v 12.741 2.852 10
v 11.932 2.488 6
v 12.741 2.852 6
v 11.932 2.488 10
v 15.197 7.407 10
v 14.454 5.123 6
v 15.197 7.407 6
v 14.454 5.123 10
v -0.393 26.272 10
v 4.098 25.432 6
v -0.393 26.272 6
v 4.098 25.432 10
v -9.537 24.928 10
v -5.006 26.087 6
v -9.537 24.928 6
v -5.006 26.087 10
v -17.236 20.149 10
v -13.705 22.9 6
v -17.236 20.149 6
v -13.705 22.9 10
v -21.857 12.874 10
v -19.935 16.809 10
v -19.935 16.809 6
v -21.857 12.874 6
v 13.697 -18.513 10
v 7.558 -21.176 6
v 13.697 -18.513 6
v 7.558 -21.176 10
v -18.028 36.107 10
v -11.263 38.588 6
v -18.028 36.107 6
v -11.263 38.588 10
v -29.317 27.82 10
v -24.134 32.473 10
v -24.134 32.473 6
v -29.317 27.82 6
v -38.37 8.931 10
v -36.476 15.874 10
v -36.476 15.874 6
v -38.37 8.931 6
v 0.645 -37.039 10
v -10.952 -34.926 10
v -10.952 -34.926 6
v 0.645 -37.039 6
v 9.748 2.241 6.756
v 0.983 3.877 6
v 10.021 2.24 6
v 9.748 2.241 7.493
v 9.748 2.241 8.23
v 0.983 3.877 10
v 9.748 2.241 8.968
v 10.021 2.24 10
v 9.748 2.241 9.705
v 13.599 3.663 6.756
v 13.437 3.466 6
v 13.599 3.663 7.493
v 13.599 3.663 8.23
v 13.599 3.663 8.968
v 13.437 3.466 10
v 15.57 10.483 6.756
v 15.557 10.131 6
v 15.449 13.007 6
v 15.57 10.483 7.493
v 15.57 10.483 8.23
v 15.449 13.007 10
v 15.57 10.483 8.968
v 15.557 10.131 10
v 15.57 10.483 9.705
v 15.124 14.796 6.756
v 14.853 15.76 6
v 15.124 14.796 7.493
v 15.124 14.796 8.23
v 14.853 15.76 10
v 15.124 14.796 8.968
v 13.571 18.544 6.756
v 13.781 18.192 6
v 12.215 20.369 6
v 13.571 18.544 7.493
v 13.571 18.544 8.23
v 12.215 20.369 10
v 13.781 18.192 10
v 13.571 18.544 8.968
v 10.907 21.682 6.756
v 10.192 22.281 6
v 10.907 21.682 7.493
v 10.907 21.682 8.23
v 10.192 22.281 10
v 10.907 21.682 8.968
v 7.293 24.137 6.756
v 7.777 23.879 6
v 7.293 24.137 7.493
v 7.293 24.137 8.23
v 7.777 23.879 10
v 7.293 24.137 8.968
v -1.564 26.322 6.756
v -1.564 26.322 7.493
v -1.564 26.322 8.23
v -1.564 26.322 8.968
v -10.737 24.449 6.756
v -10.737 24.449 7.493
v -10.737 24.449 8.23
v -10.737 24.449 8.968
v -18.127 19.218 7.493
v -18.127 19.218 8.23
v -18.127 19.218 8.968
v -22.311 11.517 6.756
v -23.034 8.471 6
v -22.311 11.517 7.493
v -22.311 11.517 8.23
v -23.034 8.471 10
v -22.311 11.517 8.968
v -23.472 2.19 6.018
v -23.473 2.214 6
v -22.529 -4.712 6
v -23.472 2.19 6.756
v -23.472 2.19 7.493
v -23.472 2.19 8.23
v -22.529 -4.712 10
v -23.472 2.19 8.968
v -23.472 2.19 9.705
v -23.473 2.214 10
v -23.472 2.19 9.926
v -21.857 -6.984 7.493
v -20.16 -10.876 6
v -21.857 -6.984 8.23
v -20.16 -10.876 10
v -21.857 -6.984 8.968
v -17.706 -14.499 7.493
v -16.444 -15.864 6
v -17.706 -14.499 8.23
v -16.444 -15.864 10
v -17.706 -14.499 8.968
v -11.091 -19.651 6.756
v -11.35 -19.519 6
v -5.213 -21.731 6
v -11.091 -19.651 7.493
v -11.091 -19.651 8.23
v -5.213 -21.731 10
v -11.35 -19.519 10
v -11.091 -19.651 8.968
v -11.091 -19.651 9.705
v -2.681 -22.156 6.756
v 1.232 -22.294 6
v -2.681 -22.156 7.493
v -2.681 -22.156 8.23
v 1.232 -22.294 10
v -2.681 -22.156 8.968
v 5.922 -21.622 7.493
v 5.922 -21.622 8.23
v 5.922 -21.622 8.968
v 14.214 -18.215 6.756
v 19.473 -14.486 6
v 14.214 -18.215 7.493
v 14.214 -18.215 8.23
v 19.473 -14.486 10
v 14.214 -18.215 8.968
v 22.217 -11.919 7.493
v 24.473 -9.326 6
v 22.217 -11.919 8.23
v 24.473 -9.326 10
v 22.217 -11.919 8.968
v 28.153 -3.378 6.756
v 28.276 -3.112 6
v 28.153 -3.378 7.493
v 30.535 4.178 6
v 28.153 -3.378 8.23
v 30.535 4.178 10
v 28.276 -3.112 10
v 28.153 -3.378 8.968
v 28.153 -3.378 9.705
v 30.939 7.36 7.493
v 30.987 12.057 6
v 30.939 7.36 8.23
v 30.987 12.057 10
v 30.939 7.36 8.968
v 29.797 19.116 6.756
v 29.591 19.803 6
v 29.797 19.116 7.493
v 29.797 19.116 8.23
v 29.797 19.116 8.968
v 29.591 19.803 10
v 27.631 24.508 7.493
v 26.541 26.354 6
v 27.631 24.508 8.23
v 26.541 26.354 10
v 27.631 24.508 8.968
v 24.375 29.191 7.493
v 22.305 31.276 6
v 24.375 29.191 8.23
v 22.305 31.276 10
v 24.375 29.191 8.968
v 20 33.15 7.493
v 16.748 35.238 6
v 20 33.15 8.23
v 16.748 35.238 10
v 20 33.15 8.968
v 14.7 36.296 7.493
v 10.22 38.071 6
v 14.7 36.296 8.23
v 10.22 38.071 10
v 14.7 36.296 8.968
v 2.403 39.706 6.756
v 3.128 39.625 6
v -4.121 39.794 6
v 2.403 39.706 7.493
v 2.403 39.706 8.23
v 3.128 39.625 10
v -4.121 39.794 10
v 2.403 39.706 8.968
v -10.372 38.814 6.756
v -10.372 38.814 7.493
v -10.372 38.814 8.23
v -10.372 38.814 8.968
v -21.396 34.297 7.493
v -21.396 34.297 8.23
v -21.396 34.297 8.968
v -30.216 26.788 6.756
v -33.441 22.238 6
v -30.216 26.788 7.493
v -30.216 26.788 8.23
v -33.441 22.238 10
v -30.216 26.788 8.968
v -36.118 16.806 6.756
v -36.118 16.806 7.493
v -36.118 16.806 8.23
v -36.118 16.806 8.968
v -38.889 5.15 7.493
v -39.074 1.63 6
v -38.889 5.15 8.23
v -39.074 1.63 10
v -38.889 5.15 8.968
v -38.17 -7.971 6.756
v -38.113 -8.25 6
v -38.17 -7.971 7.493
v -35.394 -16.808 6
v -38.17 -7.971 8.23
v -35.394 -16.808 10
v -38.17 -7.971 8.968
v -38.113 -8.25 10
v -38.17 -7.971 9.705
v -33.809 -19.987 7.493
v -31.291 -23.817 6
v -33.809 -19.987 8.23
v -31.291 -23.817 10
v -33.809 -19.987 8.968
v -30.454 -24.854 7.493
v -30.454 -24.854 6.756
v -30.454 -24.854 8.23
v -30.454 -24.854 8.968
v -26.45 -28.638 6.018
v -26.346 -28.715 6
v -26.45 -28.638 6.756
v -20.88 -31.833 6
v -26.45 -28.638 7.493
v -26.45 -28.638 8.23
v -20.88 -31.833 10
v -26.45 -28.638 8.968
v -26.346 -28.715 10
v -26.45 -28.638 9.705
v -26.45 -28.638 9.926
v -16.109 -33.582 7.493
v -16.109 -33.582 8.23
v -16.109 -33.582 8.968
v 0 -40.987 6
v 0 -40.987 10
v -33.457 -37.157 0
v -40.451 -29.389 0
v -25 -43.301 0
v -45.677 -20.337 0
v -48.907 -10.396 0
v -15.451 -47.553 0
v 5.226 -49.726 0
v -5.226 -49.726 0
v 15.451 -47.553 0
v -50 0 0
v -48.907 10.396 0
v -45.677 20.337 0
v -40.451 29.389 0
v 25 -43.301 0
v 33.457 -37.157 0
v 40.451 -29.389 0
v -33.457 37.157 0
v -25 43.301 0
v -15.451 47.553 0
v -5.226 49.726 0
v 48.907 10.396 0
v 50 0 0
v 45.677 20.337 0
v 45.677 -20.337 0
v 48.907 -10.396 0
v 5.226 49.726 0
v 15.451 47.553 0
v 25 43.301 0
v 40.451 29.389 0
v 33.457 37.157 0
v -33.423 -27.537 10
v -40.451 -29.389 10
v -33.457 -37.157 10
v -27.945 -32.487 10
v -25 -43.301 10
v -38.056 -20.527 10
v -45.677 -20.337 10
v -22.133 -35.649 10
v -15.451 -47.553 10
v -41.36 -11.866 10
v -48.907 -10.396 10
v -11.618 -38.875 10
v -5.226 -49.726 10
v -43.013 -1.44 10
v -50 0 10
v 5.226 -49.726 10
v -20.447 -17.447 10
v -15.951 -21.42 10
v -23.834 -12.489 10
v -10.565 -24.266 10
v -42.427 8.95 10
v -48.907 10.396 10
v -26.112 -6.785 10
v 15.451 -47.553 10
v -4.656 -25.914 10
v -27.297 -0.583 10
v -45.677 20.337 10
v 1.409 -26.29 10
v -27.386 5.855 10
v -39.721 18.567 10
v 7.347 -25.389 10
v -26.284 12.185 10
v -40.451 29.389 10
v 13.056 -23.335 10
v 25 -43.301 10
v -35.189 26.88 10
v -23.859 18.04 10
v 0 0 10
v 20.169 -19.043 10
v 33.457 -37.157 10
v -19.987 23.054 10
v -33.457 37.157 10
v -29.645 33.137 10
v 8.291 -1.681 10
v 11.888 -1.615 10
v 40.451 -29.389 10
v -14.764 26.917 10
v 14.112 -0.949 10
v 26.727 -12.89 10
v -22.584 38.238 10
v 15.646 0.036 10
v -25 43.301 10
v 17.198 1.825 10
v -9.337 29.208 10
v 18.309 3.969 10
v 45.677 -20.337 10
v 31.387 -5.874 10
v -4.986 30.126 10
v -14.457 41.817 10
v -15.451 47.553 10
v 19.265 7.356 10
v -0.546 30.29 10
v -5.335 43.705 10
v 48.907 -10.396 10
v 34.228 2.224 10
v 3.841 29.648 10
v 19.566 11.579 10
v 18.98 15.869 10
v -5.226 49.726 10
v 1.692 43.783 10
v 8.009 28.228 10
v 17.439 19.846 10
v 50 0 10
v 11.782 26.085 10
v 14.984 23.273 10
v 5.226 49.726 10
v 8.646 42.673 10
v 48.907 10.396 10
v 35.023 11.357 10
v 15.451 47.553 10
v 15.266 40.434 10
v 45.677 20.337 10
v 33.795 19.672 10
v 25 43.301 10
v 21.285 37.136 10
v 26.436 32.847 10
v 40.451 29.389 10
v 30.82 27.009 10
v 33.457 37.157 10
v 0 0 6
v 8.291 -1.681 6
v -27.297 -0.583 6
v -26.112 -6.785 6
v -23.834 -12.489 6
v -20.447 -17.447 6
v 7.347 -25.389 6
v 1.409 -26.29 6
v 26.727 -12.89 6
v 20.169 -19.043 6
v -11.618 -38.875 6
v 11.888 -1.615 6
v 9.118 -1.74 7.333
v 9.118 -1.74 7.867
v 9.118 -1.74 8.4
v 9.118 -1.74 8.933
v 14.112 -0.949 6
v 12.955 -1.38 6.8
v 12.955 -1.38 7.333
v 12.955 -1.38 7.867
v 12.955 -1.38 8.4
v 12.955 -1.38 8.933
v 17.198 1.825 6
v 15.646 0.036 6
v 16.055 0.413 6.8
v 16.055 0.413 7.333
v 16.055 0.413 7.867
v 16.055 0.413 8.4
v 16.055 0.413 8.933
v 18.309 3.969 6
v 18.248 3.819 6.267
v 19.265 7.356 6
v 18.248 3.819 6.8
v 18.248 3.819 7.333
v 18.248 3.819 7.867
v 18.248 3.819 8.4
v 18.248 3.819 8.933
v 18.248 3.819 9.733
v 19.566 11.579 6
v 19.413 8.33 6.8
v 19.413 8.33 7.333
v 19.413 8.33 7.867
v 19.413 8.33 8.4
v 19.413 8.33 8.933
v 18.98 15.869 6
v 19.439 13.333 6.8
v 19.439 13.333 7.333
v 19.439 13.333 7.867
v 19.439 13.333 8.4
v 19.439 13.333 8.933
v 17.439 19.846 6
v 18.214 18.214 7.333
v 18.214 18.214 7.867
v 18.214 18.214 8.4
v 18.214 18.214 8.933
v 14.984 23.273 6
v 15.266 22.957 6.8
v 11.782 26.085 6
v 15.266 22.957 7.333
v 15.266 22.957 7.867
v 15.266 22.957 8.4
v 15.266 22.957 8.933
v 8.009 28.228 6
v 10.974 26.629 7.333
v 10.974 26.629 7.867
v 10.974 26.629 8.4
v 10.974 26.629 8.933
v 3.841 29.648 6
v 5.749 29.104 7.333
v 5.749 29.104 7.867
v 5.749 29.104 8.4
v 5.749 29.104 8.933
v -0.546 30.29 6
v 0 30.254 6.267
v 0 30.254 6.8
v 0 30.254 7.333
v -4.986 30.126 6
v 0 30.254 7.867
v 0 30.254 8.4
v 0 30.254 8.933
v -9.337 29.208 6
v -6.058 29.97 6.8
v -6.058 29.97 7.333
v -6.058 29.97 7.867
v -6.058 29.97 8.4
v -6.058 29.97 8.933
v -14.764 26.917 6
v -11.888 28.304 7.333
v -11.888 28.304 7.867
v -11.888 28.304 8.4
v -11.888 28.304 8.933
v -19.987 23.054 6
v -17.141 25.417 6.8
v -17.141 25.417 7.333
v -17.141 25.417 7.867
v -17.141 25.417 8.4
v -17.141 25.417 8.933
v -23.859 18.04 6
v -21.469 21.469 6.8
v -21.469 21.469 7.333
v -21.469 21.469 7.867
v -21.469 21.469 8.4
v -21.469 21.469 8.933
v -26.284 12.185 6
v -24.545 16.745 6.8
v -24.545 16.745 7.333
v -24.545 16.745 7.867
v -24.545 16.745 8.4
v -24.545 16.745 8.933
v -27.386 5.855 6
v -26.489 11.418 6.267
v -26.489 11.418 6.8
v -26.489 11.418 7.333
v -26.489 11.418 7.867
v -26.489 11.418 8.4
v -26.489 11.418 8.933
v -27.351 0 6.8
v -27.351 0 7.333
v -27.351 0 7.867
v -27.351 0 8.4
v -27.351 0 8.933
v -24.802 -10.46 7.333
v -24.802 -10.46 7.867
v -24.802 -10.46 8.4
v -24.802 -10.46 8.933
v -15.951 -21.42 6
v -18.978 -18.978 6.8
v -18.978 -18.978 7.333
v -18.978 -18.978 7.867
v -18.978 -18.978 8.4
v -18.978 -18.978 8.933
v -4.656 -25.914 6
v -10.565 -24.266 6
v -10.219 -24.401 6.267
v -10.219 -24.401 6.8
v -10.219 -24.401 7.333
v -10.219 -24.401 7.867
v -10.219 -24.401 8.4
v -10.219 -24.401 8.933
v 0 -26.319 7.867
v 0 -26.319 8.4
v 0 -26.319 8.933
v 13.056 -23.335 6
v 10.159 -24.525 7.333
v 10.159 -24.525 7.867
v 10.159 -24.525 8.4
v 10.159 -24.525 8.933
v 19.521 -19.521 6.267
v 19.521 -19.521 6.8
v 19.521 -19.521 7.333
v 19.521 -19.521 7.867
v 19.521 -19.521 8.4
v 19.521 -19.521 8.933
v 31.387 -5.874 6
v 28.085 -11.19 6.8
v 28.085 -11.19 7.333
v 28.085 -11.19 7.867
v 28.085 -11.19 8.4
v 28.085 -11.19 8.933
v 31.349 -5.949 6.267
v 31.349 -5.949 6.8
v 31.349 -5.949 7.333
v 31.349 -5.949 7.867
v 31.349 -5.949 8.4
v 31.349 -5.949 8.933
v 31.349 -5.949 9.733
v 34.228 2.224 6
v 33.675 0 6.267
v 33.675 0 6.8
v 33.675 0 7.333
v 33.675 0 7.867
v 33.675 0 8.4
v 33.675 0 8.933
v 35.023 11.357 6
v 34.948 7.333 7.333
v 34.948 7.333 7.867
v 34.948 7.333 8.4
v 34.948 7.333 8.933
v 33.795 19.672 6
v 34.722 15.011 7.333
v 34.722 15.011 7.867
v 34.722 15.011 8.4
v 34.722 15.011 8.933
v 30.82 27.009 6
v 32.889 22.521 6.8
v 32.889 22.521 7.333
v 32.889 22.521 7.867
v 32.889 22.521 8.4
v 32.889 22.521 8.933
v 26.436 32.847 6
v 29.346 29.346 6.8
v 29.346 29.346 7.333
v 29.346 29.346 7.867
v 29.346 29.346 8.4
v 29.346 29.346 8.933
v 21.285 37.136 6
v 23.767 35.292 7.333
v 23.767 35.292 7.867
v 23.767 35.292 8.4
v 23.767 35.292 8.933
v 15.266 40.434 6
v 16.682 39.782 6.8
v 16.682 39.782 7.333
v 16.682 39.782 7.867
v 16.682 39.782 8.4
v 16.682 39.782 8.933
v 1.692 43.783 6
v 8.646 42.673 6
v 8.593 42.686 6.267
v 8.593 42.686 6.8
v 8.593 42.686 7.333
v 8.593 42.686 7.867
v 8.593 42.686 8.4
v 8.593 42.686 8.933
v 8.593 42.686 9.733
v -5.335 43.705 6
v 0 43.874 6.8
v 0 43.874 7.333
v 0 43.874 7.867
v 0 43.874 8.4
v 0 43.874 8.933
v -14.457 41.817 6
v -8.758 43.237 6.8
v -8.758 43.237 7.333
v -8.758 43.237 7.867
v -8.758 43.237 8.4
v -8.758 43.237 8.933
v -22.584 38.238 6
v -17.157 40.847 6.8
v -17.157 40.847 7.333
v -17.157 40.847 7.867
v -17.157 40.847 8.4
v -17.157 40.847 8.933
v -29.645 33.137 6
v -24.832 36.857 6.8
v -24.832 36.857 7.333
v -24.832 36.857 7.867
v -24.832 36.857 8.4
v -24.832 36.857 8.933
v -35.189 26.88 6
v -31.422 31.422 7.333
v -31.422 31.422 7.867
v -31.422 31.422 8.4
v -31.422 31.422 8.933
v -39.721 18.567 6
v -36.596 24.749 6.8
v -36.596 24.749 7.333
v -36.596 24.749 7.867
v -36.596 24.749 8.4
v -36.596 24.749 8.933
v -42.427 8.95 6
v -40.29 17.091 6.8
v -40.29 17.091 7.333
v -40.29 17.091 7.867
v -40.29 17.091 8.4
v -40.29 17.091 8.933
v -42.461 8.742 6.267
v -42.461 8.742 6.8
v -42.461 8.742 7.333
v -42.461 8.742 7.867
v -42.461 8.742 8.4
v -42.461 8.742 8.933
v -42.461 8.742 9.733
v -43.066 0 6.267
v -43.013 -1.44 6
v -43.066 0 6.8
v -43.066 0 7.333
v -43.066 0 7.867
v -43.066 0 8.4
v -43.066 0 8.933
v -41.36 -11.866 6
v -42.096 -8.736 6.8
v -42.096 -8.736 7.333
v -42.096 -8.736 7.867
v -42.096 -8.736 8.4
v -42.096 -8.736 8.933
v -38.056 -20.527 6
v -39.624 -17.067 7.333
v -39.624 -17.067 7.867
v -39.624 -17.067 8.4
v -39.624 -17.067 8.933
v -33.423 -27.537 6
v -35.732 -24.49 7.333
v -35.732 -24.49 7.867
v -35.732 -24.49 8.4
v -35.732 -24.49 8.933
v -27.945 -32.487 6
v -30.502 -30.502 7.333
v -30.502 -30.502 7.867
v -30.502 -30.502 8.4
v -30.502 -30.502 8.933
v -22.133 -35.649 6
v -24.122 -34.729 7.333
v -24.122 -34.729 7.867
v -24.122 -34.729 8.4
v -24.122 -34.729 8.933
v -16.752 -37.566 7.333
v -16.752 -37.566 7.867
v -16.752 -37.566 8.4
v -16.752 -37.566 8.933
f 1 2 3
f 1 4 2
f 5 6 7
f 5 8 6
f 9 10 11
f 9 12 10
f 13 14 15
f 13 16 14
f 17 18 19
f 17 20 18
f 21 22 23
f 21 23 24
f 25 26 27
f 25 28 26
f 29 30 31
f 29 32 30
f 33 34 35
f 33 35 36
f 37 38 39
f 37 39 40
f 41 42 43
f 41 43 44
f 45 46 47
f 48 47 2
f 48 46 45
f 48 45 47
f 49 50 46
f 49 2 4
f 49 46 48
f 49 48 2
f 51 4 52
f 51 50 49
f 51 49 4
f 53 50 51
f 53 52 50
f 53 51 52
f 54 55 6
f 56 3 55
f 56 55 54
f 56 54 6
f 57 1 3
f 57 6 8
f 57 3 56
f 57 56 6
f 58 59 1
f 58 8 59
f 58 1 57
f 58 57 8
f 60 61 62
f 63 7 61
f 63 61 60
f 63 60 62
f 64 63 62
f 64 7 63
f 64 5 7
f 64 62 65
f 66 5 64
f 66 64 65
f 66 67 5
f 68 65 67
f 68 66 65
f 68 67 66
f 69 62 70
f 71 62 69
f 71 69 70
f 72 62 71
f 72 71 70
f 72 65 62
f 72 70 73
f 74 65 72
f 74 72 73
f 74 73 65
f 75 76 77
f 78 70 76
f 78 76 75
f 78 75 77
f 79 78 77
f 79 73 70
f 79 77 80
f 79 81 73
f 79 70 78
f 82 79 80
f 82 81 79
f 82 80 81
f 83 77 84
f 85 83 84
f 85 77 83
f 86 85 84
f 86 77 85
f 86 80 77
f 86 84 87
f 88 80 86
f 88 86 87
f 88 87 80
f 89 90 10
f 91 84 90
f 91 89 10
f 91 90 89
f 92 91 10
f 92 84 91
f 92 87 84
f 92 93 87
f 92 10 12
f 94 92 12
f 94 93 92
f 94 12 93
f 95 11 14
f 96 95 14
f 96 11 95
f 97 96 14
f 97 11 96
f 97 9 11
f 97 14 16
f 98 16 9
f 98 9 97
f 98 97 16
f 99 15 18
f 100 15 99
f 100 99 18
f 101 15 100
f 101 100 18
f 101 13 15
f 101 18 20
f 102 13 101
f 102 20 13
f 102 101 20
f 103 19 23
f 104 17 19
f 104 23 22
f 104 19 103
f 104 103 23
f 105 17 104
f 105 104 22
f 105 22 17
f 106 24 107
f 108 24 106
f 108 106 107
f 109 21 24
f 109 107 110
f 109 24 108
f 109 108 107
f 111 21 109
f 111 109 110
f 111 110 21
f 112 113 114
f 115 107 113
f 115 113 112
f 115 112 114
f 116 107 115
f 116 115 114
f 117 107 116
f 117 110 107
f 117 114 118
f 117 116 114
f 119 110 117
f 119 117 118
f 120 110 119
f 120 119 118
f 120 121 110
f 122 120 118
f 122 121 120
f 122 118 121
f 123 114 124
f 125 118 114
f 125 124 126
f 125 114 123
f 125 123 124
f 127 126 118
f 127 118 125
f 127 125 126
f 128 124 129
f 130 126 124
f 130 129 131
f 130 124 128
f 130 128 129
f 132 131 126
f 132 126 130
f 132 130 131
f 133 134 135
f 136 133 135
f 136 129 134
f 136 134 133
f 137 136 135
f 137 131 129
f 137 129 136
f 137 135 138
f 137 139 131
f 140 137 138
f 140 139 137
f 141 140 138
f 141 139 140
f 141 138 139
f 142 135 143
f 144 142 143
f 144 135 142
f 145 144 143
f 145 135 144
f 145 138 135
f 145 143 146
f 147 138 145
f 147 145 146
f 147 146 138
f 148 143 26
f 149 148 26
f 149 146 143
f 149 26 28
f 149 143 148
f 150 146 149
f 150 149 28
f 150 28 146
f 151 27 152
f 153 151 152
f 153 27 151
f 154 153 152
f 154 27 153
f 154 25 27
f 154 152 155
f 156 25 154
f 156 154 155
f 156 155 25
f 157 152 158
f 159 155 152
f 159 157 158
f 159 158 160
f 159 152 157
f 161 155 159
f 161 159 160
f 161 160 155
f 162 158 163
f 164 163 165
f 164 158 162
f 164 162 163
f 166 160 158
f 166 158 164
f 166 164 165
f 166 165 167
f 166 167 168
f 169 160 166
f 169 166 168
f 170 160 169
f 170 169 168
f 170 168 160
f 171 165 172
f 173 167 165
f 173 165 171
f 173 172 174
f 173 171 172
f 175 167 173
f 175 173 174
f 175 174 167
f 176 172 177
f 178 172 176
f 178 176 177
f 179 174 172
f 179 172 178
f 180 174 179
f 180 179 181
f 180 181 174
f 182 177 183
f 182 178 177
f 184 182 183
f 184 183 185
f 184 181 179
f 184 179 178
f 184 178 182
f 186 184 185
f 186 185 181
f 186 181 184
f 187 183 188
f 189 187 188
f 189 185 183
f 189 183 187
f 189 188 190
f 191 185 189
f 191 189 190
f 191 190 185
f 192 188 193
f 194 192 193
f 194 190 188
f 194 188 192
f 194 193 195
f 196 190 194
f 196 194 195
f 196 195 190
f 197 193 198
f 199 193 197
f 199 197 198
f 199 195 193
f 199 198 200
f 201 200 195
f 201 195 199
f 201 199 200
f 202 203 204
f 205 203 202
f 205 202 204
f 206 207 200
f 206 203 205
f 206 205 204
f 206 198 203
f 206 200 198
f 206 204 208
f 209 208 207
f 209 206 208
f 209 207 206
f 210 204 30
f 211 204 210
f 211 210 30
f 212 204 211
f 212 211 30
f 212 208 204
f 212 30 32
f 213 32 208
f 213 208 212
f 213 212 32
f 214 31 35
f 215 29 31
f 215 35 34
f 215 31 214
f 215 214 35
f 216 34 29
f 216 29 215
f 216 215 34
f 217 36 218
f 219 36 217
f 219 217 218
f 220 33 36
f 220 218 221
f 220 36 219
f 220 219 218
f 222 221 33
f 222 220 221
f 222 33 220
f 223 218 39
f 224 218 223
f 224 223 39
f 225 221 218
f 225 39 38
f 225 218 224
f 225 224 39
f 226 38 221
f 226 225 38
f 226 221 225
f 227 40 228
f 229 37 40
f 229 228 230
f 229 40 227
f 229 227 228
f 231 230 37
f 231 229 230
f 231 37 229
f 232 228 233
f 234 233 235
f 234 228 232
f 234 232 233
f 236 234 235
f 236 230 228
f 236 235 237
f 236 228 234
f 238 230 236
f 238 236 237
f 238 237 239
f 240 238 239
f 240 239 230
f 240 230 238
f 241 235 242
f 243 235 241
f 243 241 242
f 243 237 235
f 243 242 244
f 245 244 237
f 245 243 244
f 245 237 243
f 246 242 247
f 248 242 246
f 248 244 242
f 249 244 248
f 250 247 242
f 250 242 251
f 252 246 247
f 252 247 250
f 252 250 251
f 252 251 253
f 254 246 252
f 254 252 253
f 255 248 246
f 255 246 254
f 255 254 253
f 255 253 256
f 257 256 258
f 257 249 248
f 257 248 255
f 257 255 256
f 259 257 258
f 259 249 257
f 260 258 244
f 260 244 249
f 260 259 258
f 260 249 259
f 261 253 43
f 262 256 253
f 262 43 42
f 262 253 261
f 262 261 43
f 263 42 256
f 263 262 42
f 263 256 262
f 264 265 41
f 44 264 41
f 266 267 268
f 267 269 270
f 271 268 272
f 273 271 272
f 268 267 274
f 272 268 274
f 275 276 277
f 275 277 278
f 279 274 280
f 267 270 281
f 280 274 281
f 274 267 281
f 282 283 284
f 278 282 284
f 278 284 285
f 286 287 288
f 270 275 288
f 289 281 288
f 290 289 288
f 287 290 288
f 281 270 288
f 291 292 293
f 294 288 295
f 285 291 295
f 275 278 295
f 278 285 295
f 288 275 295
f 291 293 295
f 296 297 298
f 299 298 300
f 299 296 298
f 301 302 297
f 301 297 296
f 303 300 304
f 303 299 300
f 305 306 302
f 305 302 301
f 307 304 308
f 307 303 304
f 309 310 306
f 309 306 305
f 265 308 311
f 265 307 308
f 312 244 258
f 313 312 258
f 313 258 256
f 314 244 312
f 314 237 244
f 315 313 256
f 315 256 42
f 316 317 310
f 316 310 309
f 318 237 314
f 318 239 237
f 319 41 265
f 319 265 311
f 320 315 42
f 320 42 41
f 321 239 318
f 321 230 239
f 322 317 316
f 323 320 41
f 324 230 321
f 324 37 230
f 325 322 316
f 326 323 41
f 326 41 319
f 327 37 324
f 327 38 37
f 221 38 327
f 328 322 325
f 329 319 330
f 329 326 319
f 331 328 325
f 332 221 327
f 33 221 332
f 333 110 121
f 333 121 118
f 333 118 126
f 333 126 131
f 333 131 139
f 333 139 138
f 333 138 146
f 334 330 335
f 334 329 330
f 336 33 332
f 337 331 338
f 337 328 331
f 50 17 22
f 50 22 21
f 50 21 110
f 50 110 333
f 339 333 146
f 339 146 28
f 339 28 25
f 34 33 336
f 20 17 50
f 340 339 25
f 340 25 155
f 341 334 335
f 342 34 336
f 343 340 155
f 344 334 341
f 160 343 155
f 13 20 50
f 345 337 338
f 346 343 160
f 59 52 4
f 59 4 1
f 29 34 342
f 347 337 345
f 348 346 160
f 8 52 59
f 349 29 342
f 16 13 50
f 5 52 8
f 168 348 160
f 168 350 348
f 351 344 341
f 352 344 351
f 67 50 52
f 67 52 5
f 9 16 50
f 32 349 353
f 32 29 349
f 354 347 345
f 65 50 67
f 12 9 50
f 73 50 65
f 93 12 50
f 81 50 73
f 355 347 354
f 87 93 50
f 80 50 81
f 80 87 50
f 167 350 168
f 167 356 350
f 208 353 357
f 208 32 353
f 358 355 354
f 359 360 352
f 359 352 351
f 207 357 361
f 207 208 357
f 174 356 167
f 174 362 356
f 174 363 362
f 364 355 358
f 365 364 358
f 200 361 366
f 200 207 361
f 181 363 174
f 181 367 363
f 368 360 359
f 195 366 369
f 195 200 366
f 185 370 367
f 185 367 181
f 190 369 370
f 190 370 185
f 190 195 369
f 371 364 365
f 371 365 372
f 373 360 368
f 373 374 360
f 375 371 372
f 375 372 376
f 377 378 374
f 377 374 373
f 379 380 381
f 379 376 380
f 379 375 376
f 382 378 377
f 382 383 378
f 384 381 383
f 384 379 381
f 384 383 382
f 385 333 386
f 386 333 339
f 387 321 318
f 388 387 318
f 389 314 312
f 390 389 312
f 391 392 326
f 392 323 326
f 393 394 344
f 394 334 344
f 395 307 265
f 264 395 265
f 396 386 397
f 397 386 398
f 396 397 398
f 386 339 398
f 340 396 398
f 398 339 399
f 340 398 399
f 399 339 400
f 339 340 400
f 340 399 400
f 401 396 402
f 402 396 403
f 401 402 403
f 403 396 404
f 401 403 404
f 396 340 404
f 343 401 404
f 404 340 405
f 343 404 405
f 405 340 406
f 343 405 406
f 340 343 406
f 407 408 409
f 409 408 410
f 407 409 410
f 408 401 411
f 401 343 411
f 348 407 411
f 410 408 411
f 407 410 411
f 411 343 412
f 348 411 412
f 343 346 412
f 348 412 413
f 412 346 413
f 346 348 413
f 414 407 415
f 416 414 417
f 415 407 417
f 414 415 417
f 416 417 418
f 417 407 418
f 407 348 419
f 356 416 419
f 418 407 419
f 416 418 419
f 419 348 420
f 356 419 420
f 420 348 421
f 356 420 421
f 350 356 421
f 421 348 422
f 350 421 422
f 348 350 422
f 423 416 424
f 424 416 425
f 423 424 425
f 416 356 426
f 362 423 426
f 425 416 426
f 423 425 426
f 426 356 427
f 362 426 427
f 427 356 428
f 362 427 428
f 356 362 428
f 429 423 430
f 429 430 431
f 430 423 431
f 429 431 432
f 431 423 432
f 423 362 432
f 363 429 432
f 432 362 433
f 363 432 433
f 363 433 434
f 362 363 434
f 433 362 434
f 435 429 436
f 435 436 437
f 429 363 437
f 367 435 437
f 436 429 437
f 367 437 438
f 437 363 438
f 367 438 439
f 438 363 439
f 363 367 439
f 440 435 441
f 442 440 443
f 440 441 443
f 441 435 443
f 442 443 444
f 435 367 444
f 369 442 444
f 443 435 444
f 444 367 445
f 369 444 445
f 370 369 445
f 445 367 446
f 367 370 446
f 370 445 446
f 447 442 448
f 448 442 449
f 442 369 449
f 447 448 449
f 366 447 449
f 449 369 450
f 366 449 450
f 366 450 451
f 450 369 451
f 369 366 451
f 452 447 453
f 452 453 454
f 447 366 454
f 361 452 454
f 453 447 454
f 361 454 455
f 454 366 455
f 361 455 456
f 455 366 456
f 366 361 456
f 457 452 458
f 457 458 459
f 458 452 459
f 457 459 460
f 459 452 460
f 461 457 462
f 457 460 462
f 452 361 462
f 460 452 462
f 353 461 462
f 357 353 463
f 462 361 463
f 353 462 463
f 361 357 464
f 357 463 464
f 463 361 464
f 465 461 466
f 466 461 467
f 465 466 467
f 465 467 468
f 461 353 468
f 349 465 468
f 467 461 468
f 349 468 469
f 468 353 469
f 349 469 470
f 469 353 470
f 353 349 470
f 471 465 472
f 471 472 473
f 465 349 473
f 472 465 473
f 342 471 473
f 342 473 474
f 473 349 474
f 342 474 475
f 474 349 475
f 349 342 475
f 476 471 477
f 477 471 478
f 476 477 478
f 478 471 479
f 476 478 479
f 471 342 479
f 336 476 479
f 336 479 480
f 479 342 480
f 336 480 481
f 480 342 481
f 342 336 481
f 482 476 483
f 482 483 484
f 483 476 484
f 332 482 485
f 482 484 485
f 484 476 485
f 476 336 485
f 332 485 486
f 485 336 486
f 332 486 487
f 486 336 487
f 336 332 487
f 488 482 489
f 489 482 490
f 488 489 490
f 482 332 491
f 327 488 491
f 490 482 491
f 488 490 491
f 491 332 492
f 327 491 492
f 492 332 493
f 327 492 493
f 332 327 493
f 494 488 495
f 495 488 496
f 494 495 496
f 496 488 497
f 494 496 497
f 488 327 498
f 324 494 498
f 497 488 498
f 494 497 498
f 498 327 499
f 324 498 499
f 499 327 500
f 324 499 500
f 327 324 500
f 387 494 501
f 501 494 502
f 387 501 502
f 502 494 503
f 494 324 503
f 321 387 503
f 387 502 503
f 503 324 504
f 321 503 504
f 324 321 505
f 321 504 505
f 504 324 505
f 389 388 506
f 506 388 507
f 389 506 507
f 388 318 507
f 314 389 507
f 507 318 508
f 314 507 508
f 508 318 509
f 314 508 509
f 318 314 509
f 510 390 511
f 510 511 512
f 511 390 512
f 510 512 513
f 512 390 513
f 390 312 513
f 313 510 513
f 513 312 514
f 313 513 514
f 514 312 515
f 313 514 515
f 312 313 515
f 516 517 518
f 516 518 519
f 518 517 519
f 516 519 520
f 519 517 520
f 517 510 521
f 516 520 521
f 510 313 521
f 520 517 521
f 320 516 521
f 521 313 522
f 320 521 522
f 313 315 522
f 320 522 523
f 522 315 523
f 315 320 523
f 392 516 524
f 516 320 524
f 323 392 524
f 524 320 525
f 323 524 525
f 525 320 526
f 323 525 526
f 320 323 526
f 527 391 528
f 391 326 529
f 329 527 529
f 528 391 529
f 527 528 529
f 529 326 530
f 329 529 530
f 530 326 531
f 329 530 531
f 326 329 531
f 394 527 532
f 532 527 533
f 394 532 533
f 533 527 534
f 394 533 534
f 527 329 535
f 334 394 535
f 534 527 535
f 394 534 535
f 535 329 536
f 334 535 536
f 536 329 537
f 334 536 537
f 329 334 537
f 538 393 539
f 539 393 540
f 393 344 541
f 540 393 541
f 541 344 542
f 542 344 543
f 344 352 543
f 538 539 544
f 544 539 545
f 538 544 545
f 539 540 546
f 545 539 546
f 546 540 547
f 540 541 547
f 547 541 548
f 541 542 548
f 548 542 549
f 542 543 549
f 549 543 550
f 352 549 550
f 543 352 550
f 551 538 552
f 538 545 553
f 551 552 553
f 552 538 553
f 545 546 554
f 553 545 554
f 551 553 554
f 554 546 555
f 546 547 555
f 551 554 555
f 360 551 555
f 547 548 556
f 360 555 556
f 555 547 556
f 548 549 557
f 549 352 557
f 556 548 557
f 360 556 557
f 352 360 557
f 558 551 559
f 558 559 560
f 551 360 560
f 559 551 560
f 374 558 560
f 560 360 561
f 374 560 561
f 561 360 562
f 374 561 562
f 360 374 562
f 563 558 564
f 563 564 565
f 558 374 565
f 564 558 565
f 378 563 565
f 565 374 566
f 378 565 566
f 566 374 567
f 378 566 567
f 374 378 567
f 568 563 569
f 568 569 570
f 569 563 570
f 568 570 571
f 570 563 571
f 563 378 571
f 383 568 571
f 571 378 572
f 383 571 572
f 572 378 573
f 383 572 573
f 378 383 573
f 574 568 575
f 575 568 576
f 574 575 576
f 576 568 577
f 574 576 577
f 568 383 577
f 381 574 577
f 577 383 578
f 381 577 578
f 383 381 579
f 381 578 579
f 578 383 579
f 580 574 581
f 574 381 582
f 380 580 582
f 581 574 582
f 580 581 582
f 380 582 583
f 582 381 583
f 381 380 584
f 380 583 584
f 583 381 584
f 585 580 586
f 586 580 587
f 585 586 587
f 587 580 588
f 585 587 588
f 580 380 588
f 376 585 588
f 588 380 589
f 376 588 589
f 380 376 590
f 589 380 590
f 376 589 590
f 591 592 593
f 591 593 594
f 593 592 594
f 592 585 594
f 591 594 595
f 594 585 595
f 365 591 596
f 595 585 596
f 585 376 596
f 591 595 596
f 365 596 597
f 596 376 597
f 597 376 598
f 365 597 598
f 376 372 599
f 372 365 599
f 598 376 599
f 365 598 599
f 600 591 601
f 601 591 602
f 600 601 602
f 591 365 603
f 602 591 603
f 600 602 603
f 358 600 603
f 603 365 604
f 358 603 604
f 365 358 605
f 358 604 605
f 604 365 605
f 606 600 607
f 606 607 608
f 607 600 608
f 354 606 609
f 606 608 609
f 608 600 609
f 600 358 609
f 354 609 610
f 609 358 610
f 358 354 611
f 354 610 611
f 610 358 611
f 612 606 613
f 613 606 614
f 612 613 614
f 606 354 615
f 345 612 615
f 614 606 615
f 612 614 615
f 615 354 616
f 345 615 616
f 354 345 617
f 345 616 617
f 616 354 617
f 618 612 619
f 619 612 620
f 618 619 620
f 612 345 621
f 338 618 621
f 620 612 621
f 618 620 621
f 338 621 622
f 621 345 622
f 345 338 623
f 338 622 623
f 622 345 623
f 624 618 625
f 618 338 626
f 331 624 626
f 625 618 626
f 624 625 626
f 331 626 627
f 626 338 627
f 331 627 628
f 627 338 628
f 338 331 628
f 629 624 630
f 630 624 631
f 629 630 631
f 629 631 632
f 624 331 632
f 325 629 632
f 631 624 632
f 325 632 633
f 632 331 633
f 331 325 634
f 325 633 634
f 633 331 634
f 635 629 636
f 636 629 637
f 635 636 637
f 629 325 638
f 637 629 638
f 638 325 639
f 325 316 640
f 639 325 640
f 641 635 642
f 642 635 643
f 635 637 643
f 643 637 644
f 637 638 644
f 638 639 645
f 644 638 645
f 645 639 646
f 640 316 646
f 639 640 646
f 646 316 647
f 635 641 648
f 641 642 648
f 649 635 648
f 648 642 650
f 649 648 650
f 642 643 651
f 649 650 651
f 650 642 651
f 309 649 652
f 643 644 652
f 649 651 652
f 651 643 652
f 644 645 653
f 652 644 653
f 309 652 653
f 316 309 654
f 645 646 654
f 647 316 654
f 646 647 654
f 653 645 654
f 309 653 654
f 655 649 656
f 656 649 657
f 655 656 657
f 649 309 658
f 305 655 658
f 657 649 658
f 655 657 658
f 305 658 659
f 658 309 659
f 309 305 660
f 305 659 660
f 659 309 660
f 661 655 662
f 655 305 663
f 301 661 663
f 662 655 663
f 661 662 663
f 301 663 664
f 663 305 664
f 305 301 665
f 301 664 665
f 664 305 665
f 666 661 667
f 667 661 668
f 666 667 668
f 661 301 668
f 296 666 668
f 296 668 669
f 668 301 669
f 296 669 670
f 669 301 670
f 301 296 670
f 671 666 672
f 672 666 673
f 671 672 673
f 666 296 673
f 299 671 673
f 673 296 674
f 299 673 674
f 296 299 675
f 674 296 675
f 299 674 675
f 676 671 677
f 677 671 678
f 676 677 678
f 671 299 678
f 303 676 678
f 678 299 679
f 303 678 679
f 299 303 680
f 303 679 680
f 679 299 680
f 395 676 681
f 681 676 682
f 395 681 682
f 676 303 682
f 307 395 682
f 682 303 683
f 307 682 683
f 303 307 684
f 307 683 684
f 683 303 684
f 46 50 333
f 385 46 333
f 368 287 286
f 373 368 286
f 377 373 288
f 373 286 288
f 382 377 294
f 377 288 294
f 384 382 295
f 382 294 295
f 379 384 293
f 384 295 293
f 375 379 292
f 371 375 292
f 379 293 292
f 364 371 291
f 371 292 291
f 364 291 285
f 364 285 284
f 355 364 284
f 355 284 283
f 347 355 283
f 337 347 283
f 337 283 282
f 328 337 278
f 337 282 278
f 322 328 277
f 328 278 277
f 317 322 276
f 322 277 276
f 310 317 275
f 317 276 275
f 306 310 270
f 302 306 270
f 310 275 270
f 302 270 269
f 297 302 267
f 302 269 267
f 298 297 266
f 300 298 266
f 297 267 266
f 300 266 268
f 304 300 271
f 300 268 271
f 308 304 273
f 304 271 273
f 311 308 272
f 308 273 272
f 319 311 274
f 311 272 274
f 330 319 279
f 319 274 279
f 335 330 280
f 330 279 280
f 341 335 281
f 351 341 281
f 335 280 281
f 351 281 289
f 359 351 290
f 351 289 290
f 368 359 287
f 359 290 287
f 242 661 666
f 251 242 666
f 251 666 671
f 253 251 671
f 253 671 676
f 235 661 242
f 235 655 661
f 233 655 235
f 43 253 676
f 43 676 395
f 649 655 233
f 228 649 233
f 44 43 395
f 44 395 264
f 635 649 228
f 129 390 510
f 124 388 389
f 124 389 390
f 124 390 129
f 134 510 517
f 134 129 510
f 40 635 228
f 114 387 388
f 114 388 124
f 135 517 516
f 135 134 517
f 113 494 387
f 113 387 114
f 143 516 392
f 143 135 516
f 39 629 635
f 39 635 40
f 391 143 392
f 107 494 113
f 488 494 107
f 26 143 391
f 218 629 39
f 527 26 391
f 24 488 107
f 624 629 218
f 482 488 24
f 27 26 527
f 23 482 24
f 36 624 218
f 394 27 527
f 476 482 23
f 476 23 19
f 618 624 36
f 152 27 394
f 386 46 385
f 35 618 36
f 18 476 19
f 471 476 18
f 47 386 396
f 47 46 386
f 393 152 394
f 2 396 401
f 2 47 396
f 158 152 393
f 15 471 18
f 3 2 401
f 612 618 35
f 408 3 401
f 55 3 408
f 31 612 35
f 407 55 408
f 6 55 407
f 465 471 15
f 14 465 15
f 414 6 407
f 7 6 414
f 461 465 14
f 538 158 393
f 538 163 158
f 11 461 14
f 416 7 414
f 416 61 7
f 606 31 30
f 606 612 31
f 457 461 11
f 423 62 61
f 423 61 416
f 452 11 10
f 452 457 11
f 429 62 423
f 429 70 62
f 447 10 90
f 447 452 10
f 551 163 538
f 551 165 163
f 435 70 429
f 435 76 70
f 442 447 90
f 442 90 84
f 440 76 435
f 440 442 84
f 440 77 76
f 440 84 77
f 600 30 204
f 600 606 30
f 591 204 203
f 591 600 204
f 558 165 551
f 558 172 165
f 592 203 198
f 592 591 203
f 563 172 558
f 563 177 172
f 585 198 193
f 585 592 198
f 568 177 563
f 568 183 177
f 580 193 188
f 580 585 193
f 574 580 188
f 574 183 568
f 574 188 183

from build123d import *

# Parameters (mm, degrees)
F0_R     = 50
F1_DEPTH = 10
F3_DEPTH = 4


# Not quite as in the source:
# - the dataset's text gives a spline's control points without its knots; the knots are read off the source's solid


with BuildPart() as f1:
    # F0 (on Top) → F1 (new body)
    with BuildSketch(Plane.XY):
        Circle(F0_R)
    extrude(amount=F1_DEPTH)

    # F2 (on face) → F3 (cut)
    with BuildSketch(Plane.XY.offset(10)):
        with BuildLine():
            Line((0.9829752457, 3.8773392509), (0, 0))
            add(Edge.make_bspline(
                [(0, 0), (6.1989170972, -1.5715369903), (18.3009054469, -4.5820748684), (22.2708690558, 21.098136745), (0.0735061662, 34.2606933049), (-24.696823294, 23.9432686999), (-29.5777293656, -0.2026812836), (-21.242860416, -21.0513155032), (0.3063219845, -28.9137402116), (20.8650084968, -20.9802440135), (37.2875332391, -1.1549707016), (34.1376870072, 33.13508074), (-0.1754280995, 48.8840289104), (-35.2364717279, 34.8889421314), (-47.3259993463, 0.3519769186), (-33.9018786494, -35.4686194222), (-11.7437604148, -39.0679776254), (0, -40.9867800772)],
                knots=[0, 0, 0, 0, 0.0525535116, 0.1096237828, 0.1717910753, 0.2358694433, 0.2986406084, 0.3592346609, 0.4192497264, 0.4797384354, 0.5450690227, 0.6175302469, 0.6936624619, 0.7710104122, 0.8480266768, 0.9244411097, 1, 1, 1, 1], degree=3))
            Line((0, -40.9867800772), (0.6450036004, -37.0391262986))
            add(Edge.make_bspline(
                [(0.9829752457, 3.8773392509), (1.9028873637, 3.6441249816), (3.6919433345, 3.1919843928), (5.7605675211, 2.732785135), (7.2810865736, 2.4662486899), (8.3436670607, 2.3240819174), (9.3169618233, 2.2451010951), (10.1887915864, 2.2314853541), (10.947954819, 2.2809860032), (11.5874524899, 2.3861900884), (12.0224756906, 2.5106115901), (12.3206036207, 2.6274021611), (12.5231974111, 2.7234627921), (12.709265499, 2.8287745147), (12.8547684896, 2.9260651259), (12.9537303385, 3.0007327444), (13.0097922913, 3.045623949), (13.065405617, 3.0919209765), (13.1368063649, 3.1548250553), (13.2546992489, 3.2666505482), (13.4080975553, 3.4280372783), (13.5988320235, 3.6574645444), (13.793011554, 3.9228491254), (14.0523488215, 4.3238331909), (14.3698276971, 4.9106602674), (14.7198907044, 5.7375729872), (15.0236752247, 6.6693304102), (15.2697160876, 7.686882739), (15.4495979877, 8.7708840237), (15.5572225131, 9.902137312), (15.5883189477, 11.0617303408), (15.5401508393, 12.231076471), (15.4113885134, 13.3919517708), (15.2369603106, 14.3374724452), (15.0579074215, 15.0722309945), (14.9042054761, 15.6104471009), (14.760291964, 16.0466031193), (14.6359044176, 16.3872240146), (14.5380910297, 16.6382401352), (14.4356903614, 16.8849254649), (14.2918948991, 17.210992659), (14.0990774833, 17.6122224287), (13.8469224085, 18.0839965323), (13.4834359088, 18.7000121361), (12.9785967796, 19.4455949123), (12.2945069159, 20.2998886289), (11.5351348638, 21.1114625837), (10.4272090237, 22.132602539), (8.873962516, 23.2862338072), (6.78302844, 24.4452320191), (4.8933370416, 25.200524048), (3.3207203095, 25.6669467244), (2.1179315126, 25.9454931128), (1.1022148065, 26.1164417869), (0.2849894908, 26.215627576), (-0.3288668952, 26.2710020117), (-0.944832867, 26.3073524442), (-1.7702133334, 26.3307890904), (-2.8071733381, 26.313405725), (-4.0551806217, 26.21906102), (-5.7169415053, 25.9971300145), (-7.776464249, 25.5433043019), (-10.175118105, 24.7317187281), (-12.4562742148, 23.6720925147), (-14.2229522716, 22.6009268113), (-15.5351787337, 21.6437533778), (-16.4640394874, 20.8791496162), (-17.1882331249, 20.2059180499), (-17.7356138092, 19.6474264532), (-18.0639925936, 19.2904481563), (-18.3182625473, 19.0002846122), (-18.5667183142, 18.7072694742), (-18.8683379851, 18.3334029952), (-19.2160160161, 17.8729710371), (-19.6608298312, 17.2435341442), (-20.1819960766, 16.4281771031), (-20.7523934885, 15.4060137367), (-21.268217967, 14.3424853647), (-21.8835524824, 12.87300129), (-22.5172852058, 10.947363596), (-23.0623530621, 8.5233456031), (-23.3946478659, 6.0188215741), (-23.4981201142, 3.8938329372), (-23.4802667425, 2.1893181877), (-23.4176091372, 0.9133395254), (-23.3069435996, -0.3556891252), (-23.1493340787, -1.6091936827), (-22.9448171574, -2.8450597271), (-22.6100002441, -4.4652743304), (-22.0757554184, -6.4318515305), (-21.25283637, -8.6762072748), (-20.4189605639, -10.4336444958), (-19.6650960756, -11.7631346357), (-19.0567723277, -12.720130822), (-18.4059032739, -13.6352485857), (-17.7126959927, -14.5069630382), (-17.0998540199, -15.1960044902), (-16.5882045354, -15.7243596211), (-16.1941571325, -16.1086306674), (-15.7879294574, -16.4824981344), (-15.2290443776, -16.9682925043), (-14.4997105828, -17.5505796161), (-13.5783323537, -18.2079519881), (-12.2929772431, -19.0269758129), (-10.5888047789, -19.938837613), (-8.4196382692, -20.8414361792), (-6.1604276162, -21.5414857343), (-4.2323299068, -21.9485938568), (-2.6807417172, -22.1651690422), (-1.5171397493, -22.2724472773), (-0.5511123318, -22.3154922103), (0.2167258913, -22.3219449036), (0.9831444969, -22.309789572), (1.9389300412, -22.2600968514), (3.4632384995, -22.1083304633), (5.3591482036, -21.7854976699), (7.6163004907, -21.1919650386), (9.8505364688, -20.3990053996), (12.0551163104, -19.4138057378), (13.8608742765, -18.4392396328), (15.2822022906, -17.5719125708), (16.159908179, -16.9942832498), (16.8550219419, -16.5115327951), (17.5455608481, -16.0150277494), (18.3959762693, -15.3715302931), (19.3933777801, -14.5631467928), (20.6890981922, -13.4376059632), (22.238475441, -11.9422761323), (23.9662259333, -10.0095081517), (25.5445342883, -7.9408680127), (26.956502869, -5.7378373633), (27.9811372935, -3.7900027382), (28.7017933347, -2.1635587764), (29.1907558737, -0.909201038), (29.6262446766, 0.3803481443), (30.0058614184, 1.7053748031), (30.3298836132, 3.0721528042), (30.6850577494, 4.9406805374), (30.9807318974, 7.3489690424), (31.0870049589, 10.3078079807), (30.9362916645, 13.2888755712), (30.5225277046, 16.2461741816), (29.9553697607, 18.6534779374), (29.3674099953, 20.5237371037), (28.859293606, 21.8936146039), (28.2840401957, 23.2258374812), (27.6416920127, 24.5158570639), (27.0505011679, 25.5521651048), (26.5439476352, 26.3560493273), (26.2133379148, 26.8476041708), (25.9403841004, 27.2341423925), (25.6609301543, 27.6174320909), (25.2998089096, 28.0900254247), (24.8478148423, 28.6466754627), (24.2207795279, 29.3746517677), (23.3921466434, 30.2575058744), (22.3290787981, 31.2718684755), (21.200584435, 32.2393418762), (19.6134002178, 33.4642423036), (17.483944727, 34.8684997774), (14.7279424465, 36.335261054), (11.8057697751, 37.5692599456), (8.7534005683, 38.5574407969), (6.1320587685, 39.1664353827), (4.0070592021, 39.5199677194), (2.4041134062, 39.7171950002), (0.7963798197, 39.845544794), (-0.8104146587, 39.9039396847), (-2.4185221304, 39.8924871177), (-4.5604842374, 39.7855984688), (-7.2265028263, 39.4825428059), (-10.383273289, 38.8561669397), (-13.4730023265, 37.9761953251), (-16.4709730035, 36.8525213366), (-19.3525929616, 35.495793691), (-22.0936516014, 33.9173549474), (-24.2410679288, 32.4271611991), (-25.8655925512, 31.1362572648), (-27.0345467632, 30.1202513865), (-28.1514618479, 29.0579692759), (-29.2135354163, 27.9508796299), (-30.2247884904, 26.7954443816), (-31.5040107866, 25.1941068986), (-32.9728421502, 23.0827380752), (-34.5230333925, 20.3897950674), (-35.8563298141, 17.5545162934), (-36.9680228455, 14.5947878667), (-37.8534777088, 11.5292202804), (-38.50829185, 8.37697423), (-38.9284090709, 5.1576759205), (-39.0798568641, 2.4353735099), (-39.0802229594, 0.2441356766), (-39.019674873, -1.404526295), (-38.8987000057, -3.0556956999), (-38.6576677887, -5.2535089233), (-38.208530677, -7.9821164763), (-37.4395364197, -11.1883361085), (-36.448526432, -14.2886044617), (-35.2450434282, -17.2455446794), (-33.8403020237, -20.0226537749), (-32.2472533044, -22.5849192117), (-30.7749066354, -24.5139138673), (-29.6749561406, -25.7433689609), (-29.0275267795, -26.4098685759), (-28.5327604029, -26.8913330618), (-28.1128643996, -27.2770255237), (-27.7727202041, -27.5758956289), (-27.2564166682, -28.0161642198), (-26.4588116506, -28.6472818821), (-25.3448536883, -29.4309811538), (-24.1795231027, -30.160947193), (-22.962356162, -30.840670048), (-21.2704230555, -31.6840980598), (-19.0271487492, -32.6276377811), (-16.139427244, -33.6044672294), (-13.0711447396, -34.448651841), (-9.8404866183, -35.1853006191), (-5.342352494, -36.061021054), (-1.7839882341, -36.6422555074), (0.6450036004, -37.0391262986)],
                knots=[0, 0, 0, 0, 0.0078125, 0.015625, 0.01953125, 0.0234375, 0.02734375, 0.03125, 0.03515625, 0.0390625, 0.04296875, 0.044921875, 0.046875, 0.048828125, 0.05078125, 0.0517578125, 0.0522460938, 0.052734375, 0.0537109375, 0.0546875, 0.056640625, 0.05859375, 0.060546875, 0.0625, 0.06640625, 0.0703125, 0.07421875, 0.078125, 0.08203125, 0.0859375, 0.08984375, 0.09375, 0.09765625, 0.1015625, 0.103515625, 0.10546875, 0.107421875, 0.1083984375, 0.109375, 0.1103515625, 0.111328125, 0.11328125, 0.115234375, 0.1171875, 0.12109375, 0.125, 0.12890625, 0.1328125, 0.140625, 0.1484375, 0.15625, 0.16015625, 0.1640625, 0.16796875, 0.169921875, 0.171875, 0.173828125, 0.17578125, 0.1796875, 0.18359375, 0.1875, 0.1953125, 0.203125, 0.2109375, 0.21875, 0.22265625, 0.2265625, 0.23046875, 0.232421875, 0.234375, 0.2353515625, 0.236328125, 0.23828125, 0.240234375, 0.2421875, 0.24609375, 0.25, 0.25390625, 0.2578125, 0.265625, 0.2734375, 0.28125, 0.2890625, 0.29296875, 0.296875, 0.30078125, 0.3046875, 0.30859375, 0.3125, 0.3203125, 0.328125, 0.3359375, 0.33984375, 0.34375, 0.34765625, 0.3515625, 0.35546875, 0.357421875, 0.359375, 0.361328125, 0.36328125, 0.3671875, 0.37109375, 0.375, 0.3828125, 0.390625, 0.3984375, 0.40625, 0.41015625, 0.4140625, 0.41796875, 0.419921875, 0.421875, 0.42578125, 0.4296875, 0.4375, 0.4453125, 0.453125, 0.4609375, 0.46875, 0.47265625, 0.4765625, 0.478515625, 0.48046875, 0.484375, 0.48828125, 0.4921875, 0.5, 0.5078125, 0.515625, 0.5234375, 0.53125, 0.53515625, 0.5390625, 0.54296875, 0.546875, 0.55078125, 0.5546875, 0.5625, 0.5703125, 0.578125, 0.5859375, 0.59375, 0.59765625, 0.6015625, 0.60546875, 0.609375, 0.61328125, 0.615234375, 0.6171875, 0.6181640625, 0.619140625, 0.62109375, 0.623046875, 0.625, 0.62890625, 0.6328125, 0.63671875, 0.640625, 0.6484375, 0.65625, 0.6640625, 0.671875, 0.6796875, 0.68359375, 0.6875, 0.69140625, 0.6953125, 0.69921875, 0.703125, 0.7109375, 0.71875, 0.7265625, 0.734375, 0.7421875, 0.75, 0.7578125, 0.76171875, 0.765625, 0.76953125, 0.7734375, 0.77734375, 0.78125, 0.7890625, 0.796875, 0.8046875, 0.8125, 0.8203125, 0.828125, 0.8359375, 0.84375, 0.84765625, 0.8515625, 0.85546875, 0.859375, 0.8671875, 0.875, 0.8828125, 0.890625, 0.8984375, 0.90625, 0.9140625, 0.91796875, 0.919921875, 0.921875, 0.923828125, 0.9248046875, 0.92578125, 0.9296875, 0.93359375, 0.9375, 0.94140625, 0.9453125, 0.953125, 0.9609375, 0.96875, 0.9765625, 0.984375, 1, 1, 1, 1], degree=3))
        make_face()
    extrude(amount=-F3_DEPTH, mode=Mode.SUBTRACT)


solid = f1.part
